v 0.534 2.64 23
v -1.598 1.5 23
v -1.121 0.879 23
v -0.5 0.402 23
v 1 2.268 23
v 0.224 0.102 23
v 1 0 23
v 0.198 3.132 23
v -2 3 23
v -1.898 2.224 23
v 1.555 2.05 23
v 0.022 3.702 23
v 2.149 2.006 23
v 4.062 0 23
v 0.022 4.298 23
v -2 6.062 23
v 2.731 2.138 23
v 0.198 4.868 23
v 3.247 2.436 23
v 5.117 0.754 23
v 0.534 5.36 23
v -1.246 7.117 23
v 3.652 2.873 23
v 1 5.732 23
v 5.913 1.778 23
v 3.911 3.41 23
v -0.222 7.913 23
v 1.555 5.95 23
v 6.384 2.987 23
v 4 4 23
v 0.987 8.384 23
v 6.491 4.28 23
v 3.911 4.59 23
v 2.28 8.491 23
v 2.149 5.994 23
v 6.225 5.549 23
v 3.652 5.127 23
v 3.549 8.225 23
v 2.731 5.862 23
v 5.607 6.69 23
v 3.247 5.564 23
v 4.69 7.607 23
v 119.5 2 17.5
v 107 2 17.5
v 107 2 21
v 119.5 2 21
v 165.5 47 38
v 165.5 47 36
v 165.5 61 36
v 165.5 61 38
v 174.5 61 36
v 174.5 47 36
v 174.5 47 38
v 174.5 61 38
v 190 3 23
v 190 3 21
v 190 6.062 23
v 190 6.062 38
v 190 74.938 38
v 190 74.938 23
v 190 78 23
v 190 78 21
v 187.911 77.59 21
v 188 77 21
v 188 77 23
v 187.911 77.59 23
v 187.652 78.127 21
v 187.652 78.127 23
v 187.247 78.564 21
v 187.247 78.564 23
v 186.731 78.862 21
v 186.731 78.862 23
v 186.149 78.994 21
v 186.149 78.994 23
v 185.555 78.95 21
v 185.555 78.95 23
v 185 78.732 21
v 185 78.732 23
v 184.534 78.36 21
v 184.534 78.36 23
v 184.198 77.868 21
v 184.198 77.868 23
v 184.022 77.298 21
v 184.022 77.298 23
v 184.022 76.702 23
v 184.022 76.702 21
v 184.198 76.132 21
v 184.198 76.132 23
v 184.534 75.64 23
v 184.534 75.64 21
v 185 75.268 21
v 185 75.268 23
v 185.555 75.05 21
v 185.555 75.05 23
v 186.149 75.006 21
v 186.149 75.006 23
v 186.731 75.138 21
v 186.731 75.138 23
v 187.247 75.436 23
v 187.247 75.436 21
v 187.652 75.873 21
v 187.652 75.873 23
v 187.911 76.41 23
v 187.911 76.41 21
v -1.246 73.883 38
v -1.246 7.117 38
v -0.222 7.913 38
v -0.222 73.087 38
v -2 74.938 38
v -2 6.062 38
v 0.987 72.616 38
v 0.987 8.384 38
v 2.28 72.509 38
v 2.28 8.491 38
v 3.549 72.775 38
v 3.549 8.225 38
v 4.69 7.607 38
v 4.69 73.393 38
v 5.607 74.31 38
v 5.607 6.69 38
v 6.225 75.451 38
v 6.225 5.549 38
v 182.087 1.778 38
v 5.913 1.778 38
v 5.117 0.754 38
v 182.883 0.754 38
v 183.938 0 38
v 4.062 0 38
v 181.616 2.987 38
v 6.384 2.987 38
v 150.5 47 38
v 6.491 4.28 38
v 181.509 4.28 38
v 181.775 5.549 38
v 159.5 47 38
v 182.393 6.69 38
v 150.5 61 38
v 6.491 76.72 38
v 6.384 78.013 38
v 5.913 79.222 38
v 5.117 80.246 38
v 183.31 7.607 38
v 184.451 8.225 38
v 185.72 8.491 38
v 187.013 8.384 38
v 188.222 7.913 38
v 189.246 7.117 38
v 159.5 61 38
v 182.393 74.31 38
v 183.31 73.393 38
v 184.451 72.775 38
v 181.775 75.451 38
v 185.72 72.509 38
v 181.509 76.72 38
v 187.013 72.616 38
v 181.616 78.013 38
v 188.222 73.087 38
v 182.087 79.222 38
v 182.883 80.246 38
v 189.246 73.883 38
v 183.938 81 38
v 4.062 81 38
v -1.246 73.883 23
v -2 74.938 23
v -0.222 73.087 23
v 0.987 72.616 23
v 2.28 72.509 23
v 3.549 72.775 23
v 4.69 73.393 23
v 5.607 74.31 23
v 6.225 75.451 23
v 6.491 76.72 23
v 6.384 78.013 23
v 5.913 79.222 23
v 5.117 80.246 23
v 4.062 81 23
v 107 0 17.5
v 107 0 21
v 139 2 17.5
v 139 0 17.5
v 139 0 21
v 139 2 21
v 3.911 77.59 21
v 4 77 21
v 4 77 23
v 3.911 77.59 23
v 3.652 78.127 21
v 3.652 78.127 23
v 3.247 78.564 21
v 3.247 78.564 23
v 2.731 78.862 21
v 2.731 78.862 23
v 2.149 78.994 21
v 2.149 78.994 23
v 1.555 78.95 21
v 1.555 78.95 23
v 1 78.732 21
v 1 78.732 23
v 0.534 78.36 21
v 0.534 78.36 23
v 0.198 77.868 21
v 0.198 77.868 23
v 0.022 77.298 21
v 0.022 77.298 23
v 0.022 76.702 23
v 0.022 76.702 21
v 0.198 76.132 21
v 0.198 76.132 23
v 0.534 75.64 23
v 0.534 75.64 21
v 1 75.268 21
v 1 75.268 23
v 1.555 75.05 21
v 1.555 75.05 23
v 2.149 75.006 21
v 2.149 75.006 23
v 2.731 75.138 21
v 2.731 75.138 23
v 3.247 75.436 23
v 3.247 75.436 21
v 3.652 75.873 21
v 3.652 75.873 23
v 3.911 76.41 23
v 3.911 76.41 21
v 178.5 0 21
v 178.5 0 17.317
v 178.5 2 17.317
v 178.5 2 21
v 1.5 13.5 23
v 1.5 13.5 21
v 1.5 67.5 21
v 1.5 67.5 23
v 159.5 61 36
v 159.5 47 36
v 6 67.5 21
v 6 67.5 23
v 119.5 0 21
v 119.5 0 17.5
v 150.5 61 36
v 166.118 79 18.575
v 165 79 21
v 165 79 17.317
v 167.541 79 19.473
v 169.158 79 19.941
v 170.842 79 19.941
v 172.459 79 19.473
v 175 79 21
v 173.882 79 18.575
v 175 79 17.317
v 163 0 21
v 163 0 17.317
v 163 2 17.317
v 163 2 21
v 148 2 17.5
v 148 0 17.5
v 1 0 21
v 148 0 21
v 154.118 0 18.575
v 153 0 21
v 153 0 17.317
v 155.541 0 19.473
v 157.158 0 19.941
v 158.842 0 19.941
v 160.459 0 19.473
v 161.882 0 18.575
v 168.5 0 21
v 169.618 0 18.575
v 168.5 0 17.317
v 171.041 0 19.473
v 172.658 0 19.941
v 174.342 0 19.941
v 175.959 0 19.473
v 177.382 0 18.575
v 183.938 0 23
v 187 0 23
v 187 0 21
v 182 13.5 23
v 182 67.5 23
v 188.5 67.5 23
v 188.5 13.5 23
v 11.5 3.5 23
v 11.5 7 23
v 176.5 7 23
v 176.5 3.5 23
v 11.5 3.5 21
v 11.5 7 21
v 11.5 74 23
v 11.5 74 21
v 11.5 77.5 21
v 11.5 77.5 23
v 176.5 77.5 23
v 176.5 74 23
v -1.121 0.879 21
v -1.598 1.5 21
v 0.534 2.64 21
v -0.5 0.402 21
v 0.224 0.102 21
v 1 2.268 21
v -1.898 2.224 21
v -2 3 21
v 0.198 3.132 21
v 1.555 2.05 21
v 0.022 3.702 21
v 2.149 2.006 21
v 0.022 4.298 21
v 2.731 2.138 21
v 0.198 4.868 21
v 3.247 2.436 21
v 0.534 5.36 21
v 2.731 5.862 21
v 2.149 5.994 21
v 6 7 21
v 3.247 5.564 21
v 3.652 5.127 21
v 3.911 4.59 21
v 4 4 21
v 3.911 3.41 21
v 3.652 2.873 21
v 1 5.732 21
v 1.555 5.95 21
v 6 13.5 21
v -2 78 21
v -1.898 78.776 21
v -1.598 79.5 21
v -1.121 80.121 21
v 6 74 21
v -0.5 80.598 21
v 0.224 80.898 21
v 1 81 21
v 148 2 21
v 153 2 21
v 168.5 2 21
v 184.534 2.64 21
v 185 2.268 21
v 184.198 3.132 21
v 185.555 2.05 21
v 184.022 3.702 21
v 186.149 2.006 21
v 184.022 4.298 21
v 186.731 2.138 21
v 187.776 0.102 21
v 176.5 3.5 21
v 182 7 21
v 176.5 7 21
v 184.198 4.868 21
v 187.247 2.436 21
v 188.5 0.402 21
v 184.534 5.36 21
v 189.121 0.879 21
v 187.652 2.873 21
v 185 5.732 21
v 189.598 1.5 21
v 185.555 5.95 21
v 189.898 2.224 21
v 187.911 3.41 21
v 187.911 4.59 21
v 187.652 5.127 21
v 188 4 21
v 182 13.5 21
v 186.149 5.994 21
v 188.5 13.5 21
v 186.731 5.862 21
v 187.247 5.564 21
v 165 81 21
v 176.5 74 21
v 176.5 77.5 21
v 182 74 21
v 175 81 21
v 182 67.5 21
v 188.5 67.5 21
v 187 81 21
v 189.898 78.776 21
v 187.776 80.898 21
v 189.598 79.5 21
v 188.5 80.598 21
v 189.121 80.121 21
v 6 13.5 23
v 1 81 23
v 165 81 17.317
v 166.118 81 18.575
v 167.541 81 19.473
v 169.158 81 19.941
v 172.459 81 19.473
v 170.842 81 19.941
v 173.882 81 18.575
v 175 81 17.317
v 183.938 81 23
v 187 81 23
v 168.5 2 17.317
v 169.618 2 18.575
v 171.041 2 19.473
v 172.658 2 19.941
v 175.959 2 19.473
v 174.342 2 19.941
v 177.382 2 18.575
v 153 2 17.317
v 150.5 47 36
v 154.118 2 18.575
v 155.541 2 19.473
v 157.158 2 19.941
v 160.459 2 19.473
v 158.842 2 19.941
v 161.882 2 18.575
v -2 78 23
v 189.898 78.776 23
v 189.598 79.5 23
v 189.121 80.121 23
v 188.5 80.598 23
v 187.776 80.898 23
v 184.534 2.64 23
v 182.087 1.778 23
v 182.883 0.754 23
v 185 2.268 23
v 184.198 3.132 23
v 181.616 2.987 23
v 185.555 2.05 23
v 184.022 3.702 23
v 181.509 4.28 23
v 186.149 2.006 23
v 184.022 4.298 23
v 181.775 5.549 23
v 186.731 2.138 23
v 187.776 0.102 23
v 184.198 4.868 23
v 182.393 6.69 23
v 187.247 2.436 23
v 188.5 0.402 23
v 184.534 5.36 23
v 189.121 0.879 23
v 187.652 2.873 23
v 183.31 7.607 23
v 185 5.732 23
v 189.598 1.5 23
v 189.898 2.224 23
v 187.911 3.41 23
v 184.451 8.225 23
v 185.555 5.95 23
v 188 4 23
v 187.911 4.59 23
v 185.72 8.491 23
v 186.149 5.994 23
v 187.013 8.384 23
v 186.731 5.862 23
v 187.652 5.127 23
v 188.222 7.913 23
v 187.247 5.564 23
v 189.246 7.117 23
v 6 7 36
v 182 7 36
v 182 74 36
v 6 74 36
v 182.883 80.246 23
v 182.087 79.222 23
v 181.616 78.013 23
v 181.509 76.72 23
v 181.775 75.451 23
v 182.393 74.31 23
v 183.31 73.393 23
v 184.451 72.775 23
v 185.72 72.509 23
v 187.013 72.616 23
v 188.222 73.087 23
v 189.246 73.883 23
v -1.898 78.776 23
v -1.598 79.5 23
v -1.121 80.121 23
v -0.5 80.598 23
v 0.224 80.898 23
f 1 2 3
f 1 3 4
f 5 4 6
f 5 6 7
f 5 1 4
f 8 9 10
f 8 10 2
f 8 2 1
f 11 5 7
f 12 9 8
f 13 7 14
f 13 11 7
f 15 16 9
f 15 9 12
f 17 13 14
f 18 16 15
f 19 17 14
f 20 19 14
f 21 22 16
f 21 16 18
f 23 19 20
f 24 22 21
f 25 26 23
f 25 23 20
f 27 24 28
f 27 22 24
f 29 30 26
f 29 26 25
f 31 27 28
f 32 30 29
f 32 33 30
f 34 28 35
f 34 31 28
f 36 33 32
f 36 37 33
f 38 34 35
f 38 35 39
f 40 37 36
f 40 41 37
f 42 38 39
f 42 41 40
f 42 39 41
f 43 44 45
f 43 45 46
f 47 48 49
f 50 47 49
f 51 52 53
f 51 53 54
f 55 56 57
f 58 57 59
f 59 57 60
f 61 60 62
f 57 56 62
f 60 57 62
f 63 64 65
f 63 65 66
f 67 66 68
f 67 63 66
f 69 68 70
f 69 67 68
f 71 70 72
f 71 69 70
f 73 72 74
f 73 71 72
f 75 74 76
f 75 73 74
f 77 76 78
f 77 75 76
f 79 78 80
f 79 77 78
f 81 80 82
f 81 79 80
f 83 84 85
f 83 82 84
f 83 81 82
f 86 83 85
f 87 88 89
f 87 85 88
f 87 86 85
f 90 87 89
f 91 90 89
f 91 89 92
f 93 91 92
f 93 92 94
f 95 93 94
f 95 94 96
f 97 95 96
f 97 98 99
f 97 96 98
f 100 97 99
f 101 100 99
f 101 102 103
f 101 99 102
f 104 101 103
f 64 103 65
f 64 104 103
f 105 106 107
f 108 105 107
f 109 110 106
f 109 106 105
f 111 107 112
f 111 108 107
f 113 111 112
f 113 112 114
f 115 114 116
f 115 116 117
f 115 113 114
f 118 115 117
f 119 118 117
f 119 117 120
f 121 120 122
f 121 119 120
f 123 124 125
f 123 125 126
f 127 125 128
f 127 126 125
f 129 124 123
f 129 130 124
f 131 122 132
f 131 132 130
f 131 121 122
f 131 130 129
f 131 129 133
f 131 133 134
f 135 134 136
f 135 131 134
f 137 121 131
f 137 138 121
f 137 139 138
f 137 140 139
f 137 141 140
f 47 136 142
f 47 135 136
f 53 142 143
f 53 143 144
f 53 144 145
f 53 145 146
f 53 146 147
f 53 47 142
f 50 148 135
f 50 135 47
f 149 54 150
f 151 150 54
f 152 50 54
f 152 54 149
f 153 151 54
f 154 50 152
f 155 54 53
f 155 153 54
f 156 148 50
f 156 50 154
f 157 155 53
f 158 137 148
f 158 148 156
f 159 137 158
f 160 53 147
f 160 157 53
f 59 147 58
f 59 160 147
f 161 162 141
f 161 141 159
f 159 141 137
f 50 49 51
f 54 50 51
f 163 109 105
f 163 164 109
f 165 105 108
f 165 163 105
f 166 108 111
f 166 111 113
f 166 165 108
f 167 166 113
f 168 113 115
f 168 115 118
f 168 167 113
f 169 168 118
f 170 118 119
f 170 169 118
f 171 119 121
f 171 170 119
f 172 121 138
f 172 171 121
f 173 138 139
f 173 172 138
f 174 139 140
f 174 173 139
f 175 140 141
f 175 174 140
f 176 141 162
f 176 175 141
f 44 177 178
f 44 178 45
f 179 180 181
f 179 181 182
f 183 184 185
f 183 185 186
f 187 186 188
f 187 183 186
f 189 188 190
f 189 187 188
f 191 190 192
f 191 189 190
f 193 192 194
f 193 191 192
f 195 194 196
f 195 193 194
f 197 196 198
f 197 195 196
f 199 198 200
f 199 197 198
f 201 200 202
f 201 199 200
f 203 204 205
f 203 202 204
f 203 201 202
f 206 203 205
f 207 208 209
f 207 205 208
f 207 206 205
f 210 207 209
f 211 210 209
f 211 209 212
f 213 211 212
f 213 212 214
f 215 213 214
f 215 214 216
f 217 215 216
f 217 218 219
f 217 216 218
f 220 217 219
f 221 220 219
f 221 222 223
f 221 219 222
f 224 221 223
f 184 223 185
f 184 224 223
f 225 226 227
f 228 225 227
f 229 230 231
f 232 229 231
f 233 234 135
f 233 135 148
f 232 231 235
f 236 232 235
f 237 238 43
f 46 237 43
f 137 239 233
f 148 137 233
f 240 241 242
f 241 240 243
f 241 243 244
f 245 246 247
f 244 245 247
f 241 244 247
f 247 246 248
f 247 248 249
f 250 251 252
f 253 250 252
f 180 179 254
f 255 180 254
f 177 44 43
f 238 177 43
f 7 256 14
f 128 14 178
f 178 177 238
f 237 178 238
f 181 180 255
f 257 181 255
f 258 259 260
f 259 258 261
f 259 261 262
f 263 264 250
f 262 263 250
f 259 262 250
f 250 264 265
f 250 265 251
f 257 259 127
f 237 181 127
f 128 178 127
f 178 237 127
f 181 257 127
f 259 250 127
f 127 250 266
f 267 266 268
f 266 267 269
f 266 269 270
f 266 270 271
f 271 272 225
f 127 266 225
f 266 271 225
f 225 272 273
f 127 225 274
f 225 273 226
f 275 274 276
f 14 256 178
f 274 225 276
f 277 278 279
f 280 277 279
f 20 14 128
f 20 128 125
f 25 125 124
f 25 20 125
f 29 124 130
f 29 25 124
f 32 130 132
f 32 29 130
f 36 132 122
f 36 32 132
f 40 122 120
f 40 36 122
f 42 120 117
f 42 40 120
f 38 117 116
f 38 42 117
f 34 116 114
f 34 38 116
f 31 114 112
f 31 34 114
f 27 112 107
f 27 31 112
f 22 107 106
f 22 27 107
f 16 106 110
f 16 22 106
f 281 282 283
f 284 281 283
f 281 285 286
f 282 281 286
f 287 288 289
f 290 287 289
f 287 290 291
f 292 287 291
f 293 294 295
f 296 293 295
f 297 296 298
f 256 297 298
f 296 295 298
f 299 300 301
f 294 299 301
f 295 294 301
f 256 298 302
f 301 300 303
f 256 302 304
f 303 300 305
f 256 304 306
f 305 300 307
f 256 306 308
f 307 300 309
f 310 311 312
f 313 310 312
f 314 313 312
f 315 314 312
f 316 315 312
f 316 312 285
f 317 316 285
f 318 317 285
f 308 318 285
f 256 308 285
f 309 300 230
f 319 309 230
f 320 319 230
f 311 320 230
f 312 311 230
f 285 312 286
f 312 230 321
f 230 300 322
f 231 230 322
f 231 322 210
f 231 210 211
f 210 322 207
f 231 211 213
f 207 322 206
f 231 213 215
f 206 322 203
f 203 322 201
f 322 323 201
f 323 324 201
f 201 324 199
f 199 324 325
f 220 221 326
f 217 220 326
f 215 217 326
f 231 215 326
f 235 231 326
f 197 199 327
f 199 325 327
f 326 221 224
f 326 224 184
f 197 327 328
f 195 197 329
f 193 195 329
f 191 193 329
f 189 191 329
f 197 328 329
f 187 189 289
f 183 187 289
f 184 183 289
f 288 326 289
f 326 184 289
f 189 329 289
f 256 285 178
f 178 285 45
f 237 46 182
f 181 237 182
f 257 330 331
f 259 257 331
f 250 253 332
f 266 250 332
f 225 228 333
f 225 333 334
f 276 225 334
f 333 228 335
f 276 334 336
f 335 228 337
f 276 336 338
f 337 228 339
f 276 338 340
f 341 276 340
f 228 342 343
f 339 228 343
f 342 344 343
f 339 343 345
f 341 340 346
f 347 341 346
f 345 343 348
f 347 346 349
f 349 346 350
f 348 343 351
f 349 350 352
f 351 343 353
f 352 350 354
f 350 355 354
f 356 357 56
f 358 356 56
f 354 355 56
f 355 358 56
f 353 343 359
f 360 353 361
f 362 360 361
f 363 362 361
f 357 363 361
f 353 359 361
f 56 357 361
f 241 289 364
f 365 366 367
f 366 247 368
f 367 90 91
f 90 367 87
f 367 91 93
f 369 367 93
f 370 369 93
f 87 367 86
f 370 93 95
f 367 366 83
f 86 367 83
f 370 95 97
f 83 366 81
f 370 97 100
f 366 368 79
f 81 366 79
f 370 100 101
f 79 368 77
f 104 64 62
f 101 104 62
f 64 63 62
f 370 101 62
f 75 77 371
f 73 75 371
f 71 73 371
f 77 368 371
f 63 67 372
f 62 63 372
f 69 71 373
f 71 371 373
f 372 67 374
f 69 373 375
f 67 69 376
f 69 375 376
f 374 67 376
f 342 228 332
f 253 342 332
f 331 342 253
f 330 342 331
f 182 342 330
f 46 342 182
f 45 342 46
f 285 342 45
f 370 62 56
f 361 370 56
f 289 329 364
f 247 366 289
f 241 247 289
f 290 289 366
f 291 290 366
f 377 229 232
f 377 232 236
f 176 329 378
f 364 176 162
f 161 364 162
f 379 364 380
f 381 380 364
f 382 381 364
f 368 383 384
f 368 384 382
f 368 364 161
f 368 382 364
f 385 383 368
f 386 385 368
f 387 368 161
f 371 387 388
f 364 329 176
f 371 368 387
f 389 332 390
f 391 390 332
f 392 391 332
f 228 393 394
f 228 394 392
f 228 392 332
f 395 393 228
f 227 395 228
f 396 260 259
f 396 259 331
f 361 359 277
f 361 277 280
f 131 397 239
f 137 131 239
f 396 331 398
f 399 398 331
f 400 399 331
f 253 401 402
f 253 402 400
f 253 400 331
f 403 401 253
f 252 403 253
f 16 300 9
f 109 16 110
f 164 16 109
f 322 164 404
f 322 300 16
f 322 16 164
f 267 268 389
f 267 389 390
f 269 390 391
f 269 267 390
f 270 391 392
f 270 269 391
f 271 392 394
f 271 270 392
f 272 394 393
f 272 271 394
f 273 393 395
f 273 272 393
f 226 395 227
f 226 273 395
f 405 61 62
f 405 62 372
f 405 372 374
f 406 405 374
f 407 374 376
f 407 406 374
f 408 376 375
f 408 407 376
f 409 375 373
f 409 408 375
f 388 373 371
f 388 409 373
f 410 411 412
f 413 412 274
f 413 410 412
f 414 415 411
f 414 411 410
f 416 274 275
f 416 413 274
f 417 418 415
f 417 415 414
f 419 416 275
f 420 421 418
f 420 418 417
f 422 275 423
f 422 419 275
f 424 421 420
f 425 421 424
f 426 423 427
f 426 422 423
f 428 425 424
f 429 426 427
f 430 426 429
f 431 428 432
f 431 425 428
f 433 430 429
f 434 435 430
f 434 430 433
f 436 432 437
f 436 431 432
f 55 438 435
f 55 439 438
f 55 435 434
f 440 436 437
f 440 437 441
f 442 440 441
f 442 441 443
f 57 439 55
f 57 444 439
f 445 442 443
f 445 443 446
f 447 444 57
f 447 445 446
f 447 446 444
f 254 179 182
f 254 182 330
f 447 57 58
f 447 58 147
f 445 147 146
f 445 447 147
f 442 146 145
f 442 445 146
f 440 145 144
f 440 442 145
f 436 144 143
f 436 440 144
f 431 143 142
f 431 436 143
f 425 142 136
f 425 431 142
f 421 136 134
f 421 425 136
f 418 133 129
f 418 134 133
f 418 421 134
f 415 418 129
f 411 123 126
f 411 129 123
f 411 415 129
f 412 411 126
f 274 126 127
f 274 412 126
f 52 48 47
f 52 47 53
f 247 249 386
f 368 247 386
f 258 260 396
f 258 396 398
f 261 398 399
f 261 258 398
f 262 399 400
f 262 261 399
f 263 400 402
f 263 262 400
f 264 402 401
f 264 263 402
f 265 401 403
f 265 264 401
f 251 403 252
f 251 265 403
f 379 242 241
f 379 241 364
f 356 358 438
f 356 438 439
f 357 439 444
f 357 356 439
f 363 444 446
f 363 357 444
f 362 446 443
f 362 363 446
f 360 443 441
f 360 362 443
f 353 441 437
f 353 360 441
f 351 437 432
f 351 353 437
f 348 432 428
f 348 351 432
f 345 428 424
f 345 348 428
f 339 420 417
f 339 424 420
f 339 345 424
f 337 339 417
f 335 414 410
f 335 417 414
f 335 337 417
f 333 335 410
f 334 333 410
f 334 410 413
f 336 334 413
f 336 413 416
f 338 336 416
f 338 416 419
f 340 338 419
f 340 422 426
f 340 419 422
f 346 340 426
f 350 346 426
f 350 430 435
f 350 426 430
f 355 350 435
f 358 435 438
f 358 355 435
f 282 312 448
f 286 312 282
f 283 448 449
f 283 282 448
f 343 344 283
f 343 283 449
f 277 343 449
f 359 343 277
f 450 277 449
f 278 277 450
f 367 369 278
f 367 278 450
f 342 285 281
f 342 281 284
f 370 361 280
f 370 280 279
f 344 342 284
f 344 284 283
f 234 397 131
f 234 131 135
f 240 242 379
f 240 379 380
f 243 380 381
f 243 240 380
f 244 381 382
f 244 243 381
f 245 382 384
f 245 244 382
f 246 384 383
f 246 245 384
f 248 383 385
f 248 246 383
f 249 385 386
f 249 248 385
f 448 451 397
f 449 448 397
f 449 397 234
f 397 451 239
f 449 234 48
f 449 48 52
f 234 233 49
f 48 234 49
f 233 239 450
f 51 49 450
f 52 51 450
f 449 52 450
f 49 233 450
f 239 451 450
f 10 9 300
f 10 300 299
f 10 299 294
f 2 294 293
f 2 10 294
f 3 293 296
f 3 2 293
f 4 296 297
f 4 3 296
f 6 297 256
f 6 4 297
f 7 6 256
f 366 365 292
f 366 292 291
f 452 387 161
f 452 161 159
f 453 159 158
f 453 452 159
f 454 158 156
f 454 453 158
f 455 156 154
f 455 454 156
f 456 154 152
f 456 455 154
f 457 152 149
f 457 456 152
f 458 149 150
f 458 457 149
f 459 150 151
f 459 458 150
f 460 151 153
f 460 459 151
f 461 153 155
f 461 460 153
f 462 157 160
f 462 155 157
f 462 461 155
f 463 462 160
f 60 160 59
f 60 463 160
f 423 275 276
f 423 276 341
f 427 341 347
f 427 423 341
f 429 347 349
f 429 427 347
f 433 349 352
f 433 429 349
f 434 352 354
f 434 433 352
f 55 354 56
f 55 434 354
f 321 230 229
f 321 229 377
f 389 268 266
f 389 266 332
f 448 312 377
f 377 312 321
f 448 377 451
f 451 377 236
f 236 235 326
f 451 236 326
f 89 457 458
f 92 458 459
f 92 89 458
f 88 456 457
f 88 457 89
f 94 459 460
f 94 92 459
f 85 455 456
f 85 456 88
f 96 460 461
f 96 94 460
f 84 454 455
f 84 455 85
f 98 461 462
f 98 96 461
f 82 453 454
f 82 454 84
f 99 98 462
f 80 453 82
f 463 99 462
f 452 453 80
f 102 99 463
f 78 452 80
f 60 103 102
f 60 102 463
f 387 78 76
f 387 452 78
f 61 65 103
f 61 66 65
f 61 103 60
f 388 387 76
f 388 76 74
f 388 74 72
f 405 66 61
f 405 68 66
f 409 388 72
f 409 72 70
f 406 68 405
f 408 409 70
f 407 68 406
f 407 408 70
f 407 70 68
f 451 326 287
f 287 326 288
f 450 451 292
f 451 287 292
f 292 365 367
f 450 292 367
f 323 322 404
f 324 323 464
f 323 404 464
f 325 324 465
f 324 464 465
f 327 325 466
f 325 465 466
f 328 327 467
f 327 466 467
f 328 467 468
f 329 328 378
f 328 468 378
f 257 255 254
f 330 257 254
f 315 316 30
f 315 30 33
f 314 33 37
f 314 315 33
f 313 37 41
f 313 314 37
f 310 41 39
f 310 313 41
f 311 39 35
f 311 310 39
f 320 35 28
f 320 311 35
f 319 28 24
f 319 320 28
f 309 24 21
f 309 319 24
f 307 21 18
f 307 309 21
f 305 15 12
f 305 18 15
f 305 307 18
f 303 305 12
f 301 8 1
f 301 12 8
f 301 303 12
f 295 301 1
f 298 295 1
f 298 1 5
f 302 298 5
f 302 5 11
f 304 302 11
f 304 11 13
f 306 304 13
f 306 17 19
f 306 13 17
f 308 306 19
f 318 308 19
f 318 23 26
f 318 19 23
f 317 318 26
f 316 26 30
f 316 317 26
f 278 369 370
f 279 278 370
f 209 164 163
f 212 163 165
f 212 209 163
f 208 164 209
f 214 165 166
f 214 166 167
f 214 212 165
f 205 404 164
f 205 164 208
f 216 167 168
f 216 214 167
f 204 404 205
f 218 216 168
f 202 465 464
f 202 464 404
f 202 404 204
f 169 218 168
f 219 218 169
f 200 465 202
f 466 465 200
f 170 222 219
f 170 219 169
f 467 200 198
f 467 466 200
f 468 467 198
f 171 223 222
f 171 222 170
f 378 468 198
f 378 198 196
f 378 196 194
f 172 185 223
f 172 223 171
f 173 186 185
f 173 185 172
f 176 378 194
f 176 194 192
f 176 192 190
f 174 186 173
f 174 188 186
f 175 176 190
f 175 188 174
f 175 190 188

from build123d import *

# Parameters (mm, degrees)
BOX034_W          = 9
BOX034_H          = 2
BOX034_DEPTH      = 10
CYLINDER027_R     = 6
CYLINDER027_DEPTH = 10
BOX035_W          = 10
BOX035_H          = 2
BOX035_DEPTH      = 10
CYLINDER028_R     = 6
CYLINDER028_DEPTH = 10
BOX036_W          = 10
BOX036_H          = 2
BOX036_DEPTH      = 10
CYLINDER029_R     = 6
CYLINDER029_DEPTH = 10
BOX037_W          = 10
BOX037_H          = 2
BOX037_DEPTH      = 10
BOX033_W          = 12.5
BOX033_H          = 2
BOX033_DEPTH      = 10
BOX032_W          = 9
BOX032_H          = 14
BOX032_DEPTH      = 10
BOX031_W          = 9
BOX031_H          = 14
BOX031_DEPTH      = 10
CYLINDER023_R     = 4.5
CYLINDER023_DEPTH = 20
CYLINDER024_R     = 4.5
CYLINDER024_DEPTH = 20
CYLINDER025_R     = 4.5
CYLINDER025_DEPTH = 20
CYLINDER026_R     = 4.5
CYLINDER026_DEPTH = 20
CYLINDER020_R     = 2
CYLINDER020_DEPTH = 20
CYLINDER021_R     = 2
CYLINDER021_DEPTH = 20
CYLINDER022_R     = 2
CYLINDER022_DEPTH = 20
CYLINDER019_R     = 2
CYLINDER019_DEPTH = 20
BOX030_W          = 176
BOX030_H          = 67
BOX030_DEPTH      = 15
BOX029_W          = 165
BOX029_H          = 74
BOX029_DEPTH      = 2
BOX028_W          = 187
BOX028_H          = 54
BOX028_DEPTH      = 2
BOX027_W          = 192
BOX027_H          = 81
BOX027_DEPTH      = 17
FILLET001_R       = 3


with BuildPart() as cube018:
    # Box034 → Box034 (new body)
    with BuildSketch(Plane(origin=(139, 0, 17.5), x_dir=(1, 0, 0), z_dir=(0, 0, 1))):
        with Locations((4.5, 1)):
            Rectangle(BOX034_W, BOX034_H)
    extrude(amount=BOX034_DEPTH)


with BuildPart() as cylinder027:
    # Cylinder027 → Cylinder027 (new body)
    with BuildSketch(Plane(origin=(158, -4, 13), x_dir=(1, 0, 0), z_dir=(0, 1, 0))):
        Circle(CYLINDER027_R)
    extrude(amount=CYLINDER027_DEPTH)


with BuildPart() as cut010:
    # Box035 → Box035 (new body)
    with BuildSketch(Plane(origin=(153, 0, 14.5), x_dir=(1, 0, 0), z_dir=(0, 0, 1))):
        with Locations((5, 1)):
            Rectangle(BOX035_W, BOX035_H)
    extrude(amount=BOX035_DEPTH)

    # Cut010: cut Cylinder027
    add(cylinder027.part, mode=Mode.SUBTRACT)


with BuildPart() as cut010_1:
    # Cut010 placement: moved
    add(cut010.part.moved(Location((0, 0, 1))))


with BuildPart() as cylinder028:
    # Cylinder028 → Cylinder028 (new body)
    with BuildSketch(Plane(origin=(158, -4, 13), x_dir=(1, 0, 0), z_dir=(0, 1, 0))):
        Circle(CYLINDER028_R)
    extrude(amount=CYLINDER028_DEPTH)


with BuildPart() as cut011:
    # Box036 → Box036 (new body)
    with BuildSketch(Plane(origin=(153, 0, 14.5), x_dir=(1, 0, 0), z_dir=(0, 0, 1))):
        with Locations((5, 1)):
            Rectangle(BOX036_W, BOX036_H)
    extrude(amount=BOX036_DEPTH)

    # Cut011: cut Cylinder028
    add(cylinder028.part, mode=Mode.SUBTRACT)


with BuildPart() as cut011_1:
    # Cut011 placement: moved
    add(cut011.part.moved(Location((12, 79, 1))))


with BuildPart() as cylinder029:
    # Cylinder029 → Cylinder029 (new body)
    with BuildSketch(Plane(origin=(158, -4, 13), x_dir=(1, 0, 0), z_dir=(0, 1, 0))):
        Circle(CYLINDER029_R)
    extrude(amount=CYLINDER029_DEPTH)


with BuildPart() as cut012:
    # Box037 → Box037 (new body)
    with BuildSketch(Plane(origin=(153, 0, 14.5), x_dir=(1, 0, 0), z_dir=(0, 0, 1))):
        with Locations((5, 1)):
            Rectangle(BOX037_W, BOX037_H)
    extrude(amount=BOX037_DEPTH)

    # Cut012: cut Cylinder029
    add(cylinder029.part, mode=Mode.SUBTRACT)


with BuildPart() as cut012_1:
    # Cut012 placement: moved
    add(cut012.part.moved(Location((15.5, 0, 1))))


with BuildPart() as coverholes:
    # Box033 → Box033 (new body)
    with BuildSketch(Plane(origin=(107, 0, 17.5), x_dir=(1, 0, 0), z_dir=(0, 0, 1))):
        with Locations((6.25, 1)):
            Rectangle(BOX033_W, BOX033_H)
    extrude(amount=BOX033_DEPTH)

    # Compound002: union Cube018, Cut010, Cut011, Cut012
    add(cube018.part)
    add(cut010_1.part)
    add(cut011_1.part)
    add(cut012_1.part)


with BuildPart() as switch_placement_hole001:
    # Box032 → Box032 (new body)
    with BuildSketch(Plane(origin=(150.5, 47, 31), x_dir=(1, 0, 0), z_dir=(0, 0, 1))):
        with Locations((4.5, 7)):
            Rectangle(BOX032_W, BOX032_H)
    extrude(amount=BOX032_DEPTH)


with BuildPart() as compound001:
    # Box031 → Box031 (new body)
    with BuildSketch(Plane(origin=(165.5, 47, 31), x_dir=(1, 0, 0), z_dir=(0, 0, 1))):
        with Locations((4.5, 7)):
            Rectangle(BOX031_W, BOX031_H)
    extrude(amount=BOX031_DEPTH)

    # Compound001: union Switch Placement Hole001
    add(switch_placement_hole001.part)


with BuildPart() as cylinder023:
    # Cylinder023 → Cylinder023 (new body)
    with BuildSketch(Plane(origin=(2, 77, 0), x_dir=(1, 0, 0), z_dir=(0, 0, 1))):
        Circle(CYLINDER023_R)
    extrude(amount=CYLINDER023_DEPTH)


with BuildPart() as cylinder024:
    # Cylinder024 → Cylinder024 (new body)
    with BuildSketch(Plane(origin=(186, 77, 0), x_dir=(1, 0, 0), z_dir=(0, 0, 1))):
        Circle(CYLINDER024_R)
    extrude(amount=CYLINDER024_DEPTH)


with BuildPart() as cylinder025:
    # Cylinder025 → Cylinder025 (new body)
    with BuildSketch(Plane(origin=(186, 4, 0), x_dir=(1, 0, 0), z_dir=(0, 0, 1))):
        Circle(CYLINDER025_R)
    extrude(amount=CYLINDER025_DEPTH)


with BuildPart() as fusion015:
    # Cylinder026 → Cylinder026 (new body)
    with BuildSketch(Plane(origin=(2, 4, 0), x_dir=(1, 0, 0), z_dir=(0, 0, 1))):
        Circle(CYLINDER026_R)
    extrude(amount=CYLINDER026_DEPTH)

    # Fusion015: union Cylinder023, Cylinder024, Cylinder025
    add(cylinder023.part)
    add(cylinder024.part)
    add(cylinder025.part)


with BuildPart() as fusion015_1:
    # Fusion015 placement: moved
    add(fusion015.part.moved(Location((0, 0, 23))))


with BuildPart() as cylinder020:
    # Cylinder020 → Cylinder020 (new body)
    with BuildSketch(Plane(origin=(2, 77, 0), x_dir=(1, 0, 0), z_dir=(0, 0, 1))):
        Circle(CYLINDER020_R)
    extrude(amount=CYLINDER020_DEPTH)


with BuildPart() as cylinder021:
    # Cylinder021 → Cylinder021 (new body)
    with BuildSketch(Plane(origin=(186, 77, 0), x_dir=(1, 0, 0), z_dir=(0, 0, 1))):
        Circle(CYLINDER021_R)
    extrude(amount=CYLINDER021_DEPTH)


with BuildPart() as cylinder022:
    # Cylinder022 → Cylinder022 (new body)
    with BuildSketch(Plane(origin=(186, 4, 0), x_dir=(1, 0, 0), z_dir=(0, 0, 1))):
        Circle(CYLINDER022_R)
    extrude(amount=CYLINDER022_DEPTH)


with BuildPart() as fusion014:
    # Cylinder019 → Cylinder019 (new body)
    with BuildSketch(Plane(origin=(2, 4, 0), x_dir=(1, 0, 0), z_dir=(0, 0, 1))):
        Circle(CYLINDER019_R)
    extrude(amount=CYLINDER019_DEPTH)

    # Fusion014: union Cylinder020, Cylinder021, Cylinder022
    add(cylinder020.part)
    add(cylinder021.part)
    add(cylinder022.part)


with BuildPart() as fusion014_1:
    # Fusion014 placement: moved
    add(fusion014.part.moved(Location((0, 0, 18))))


with BuildPart() as cube016:
    # Box030 → Box030 (new body)
    with BuildSketch(Plane(origin=(6, 7, 21), x_dir=(1, 0, 0), z_dir=(0, 0, 1))):
        with Locations((88, 33.5)):
            Rectangle(BOX030_W, BOX030_H)
    extrude(amount=BOX030_DEPTH)


with BuildPart() as cube015:
    # Box029 → Box029 (new body)
    with BuildSketch(Plane(origin=(11.5, 3.5, 21), x_dir=(1, 0, 0), z_dir=(0, 0, 1))):
        with Locations((82.5, 37)):
            Rectangle(BOX029_W, BOX029_H)
    extrude(amount=BOX029_DEPTH)


with BuildPart() as latchforcover:
    # Box028 → Box028 (new body)
    with BuildSketch(Plane(origin=(1.5, 13.5, 21), x_dir=(1, 0, 0), z_dir=(0, 0, 1))):
        with Locations((93.5, 27)):
            Rectangle(BOX028_W, BOX028_H)
    extrude(amount=BOX028_DEPTH)

    # Fusion013: union Cube015
    add(cube015.part)


with BuildPart() as cover:
    # Box027 → Box027 (new body)
    with BuildSketch(Plane(origin=(-2, 0, 21), x_dir=(1, 0, 0), z_dir=(0, 0, 1))):
        with Locations((96, 40.5)):
            Rectangle(BOX027_W, BOX027_H)
    extrude(amount=BOX027_DEPTH)

    # Fillet001
    fillet001_edges = [cover.edges().sort_by_distance(p)[0] for p in [
        (-2, 0, 29.5),
        (-2, 81, 29.5),
        (190, 0, 29.5),
        (190, 81, 29.5),
    ]]
    fillet(fillet001_edges, radius=FILLET001_R)

    # Cut005: cut LatchForCover
    add(latchforcover.part, mode=Mode.SUBTRACT)

    # Cut006: cut Cube016
    add(cube016.part, mode=Mode.SUBTRACT)

    # Cut007: cut Fusion014
    add(fusion014_1.part, mode=Mode.SUBTRACT)

    # Cut008: cut Fusion015
    add(fusion015_1.part, mode=Mode.SUBTRACT)

    # Cut009: cut Compound001
    add(compound001.part, mode=Mode.SUBTRACT)

    # Fusion016: union CoverHoles
    add(coverholes.part)


solid = cover.part
